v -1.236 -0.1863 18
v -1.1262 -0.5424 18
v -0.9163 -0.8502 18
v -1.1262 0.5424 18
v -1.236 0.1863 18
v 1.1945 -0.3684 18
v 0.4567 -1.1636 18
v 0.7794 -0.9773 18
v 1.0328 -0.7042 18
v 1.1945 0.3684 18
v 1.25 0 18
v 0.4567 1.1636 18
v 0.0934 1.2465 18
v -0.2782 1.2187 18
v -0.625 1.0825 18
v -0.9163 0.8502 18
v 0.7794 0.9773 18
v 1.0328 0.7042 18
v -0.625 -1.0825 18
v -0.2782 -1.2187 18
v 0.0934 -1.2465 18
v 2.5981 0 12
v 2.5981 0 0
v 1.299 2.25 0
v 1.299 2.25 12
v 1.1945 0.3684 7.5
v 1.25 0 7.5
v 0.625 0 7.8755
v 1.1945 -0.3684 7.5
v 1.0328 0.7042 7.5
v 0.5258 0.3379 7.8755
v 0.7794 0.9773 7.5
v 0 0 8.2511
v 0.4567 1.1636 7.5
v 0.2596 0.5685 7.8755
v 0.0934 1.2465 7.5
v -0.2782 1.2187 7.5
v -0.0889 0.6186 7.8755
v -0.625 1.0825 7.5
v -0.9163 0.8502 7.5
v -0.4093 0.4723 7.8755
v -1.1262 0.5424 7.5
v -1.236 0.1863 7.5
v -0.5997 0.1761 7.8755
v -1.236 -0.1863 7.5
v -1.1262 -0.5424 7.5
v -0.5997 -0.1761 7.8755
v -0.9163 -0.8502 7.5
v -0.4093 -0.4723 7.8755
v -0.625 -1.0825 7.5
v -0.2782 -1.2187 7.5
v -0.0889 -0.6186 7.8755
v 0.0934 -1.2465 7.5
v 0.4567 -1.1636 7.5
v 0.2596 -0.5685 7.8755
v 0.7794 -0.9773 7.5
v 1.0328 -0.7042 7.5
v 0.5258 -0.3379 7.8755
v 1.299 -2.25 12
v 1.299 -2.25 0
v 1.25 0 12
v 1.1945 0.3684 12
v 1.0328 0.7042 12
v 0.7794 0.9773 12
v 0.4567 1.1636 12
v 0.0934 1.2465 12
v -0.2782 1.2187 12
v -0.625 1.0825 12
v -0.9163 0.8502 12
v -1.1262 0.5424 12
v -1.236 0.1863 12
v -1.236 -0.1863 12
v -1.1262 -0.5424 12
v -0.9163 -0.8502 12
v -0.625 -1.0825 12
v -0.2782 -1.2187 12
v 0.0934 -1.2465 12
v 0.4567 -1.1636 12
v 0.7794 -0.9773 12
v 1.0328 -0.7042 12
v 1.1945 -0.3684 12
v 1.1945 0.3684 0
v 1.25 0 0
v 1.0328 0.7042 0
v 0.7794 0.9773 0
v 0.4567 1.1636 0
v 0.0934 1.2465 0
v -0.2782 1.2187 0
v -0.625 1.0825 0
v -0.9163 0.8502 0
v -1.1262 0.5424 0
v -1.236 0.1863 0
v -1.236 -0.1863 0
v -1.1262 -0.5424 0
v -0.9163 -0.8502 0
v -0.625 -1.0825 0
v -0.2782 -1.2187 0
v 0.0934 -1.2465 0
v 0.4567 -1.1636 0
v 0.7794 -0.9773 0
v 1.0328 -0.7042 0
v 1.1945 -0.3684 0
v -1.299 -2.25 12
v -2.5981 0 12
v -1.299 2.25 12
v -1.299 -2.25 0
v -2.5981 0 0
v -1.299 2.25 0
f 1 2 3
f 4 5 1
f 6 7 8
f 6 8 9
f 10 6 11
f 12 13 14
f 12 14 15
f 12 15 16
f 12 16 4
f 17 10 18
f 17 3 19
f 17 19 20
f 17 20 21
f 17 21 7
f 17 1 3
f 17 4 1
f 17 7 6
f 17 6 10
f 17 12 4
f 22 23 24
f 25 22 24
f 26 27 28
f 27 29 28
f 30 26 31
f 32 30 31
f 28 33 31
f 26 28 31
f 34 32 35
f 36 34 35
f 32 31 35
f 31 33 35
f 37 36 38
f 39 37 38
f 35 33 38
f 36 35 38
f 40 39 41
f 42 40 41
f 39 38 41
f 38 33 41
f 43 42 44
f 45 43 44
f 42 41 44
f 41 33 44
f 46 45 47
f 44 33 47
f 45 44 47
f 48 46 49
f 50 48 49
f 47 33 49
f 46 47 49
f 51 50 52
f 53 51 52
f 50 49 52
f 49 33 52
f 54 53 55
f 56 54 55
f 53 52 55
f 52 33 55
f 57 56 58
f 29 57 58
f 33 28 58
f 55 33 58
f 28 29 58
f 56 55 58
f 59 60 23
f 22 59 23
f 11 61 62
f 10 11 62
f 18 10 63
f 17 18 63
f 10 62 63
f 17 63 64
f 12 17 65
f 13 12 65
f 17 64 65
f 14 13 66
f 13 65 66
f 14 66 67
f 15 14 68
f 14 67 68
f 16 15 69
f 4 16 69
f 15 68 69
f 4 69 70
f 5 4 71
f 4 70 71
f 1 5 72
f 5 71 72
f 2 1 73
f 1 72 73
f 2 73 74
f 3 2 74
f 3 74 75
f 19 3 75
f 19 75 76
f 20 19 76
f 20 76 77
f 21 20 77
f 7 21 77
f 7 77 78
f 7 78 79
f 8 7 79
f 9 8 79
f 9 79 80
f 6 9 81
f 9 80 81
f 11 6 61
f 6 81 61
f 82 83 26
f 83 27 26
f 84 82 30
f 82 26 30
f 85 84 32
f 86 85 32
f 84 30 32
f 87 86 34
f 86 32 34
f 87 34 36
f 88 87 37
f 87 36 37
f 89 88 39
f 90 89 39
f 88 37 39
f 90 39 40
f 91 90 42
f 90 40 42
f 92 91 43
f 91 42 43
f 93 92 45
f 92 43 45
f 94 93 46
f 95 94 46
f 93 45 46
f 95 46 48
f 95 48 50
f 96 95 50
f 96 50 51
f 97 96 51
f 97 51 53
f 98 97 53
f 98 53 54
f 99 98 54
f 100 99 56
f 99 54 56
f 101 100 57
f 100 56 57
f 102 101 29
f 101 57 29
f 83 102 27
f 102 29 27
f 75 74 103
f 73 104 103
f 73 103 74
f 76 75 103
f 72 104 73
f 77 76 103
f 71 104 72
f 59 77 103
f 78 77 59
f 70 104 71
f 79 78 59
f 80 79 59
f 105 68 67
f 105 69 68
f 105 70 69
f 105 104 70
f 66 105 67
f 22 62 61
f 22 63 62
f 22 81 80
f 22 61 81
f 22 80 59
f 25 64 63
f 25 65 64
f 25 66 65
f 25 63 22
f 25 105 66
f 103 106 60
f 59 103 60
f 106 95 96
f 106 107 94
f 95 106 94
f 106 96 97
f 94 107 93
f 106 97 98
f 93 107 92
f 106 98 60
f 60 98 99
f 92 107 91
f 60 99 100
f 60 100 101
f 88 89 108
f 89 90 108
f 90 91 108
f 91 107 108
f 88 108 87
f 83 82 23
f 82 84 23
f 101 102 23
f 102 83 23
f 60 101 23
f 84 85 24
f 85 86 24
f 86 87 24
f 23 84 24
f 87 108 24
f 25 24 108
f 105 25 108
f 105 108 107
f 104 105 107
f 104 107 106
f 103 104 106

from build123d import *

# Parameters (mm, degrees)
EXTRUDE_1_DEPTH = 12
SKETCH_2_R      = 1.25
EXTRUDE_2_DEPTH = 6


# Read off the part's stored shape, not the designer's step: M3 螺纹孔1
with BuildPart() as part:
    # 草图1 → 凸台-拉伸1 (new body)
    with BuildSketch(Plane.XY):
        Polygon((2.598076211, 0), (1.299038106, 2.25), (-1.299038106, 2.25), (-2.598076211, 0), (-1.299038106, -2.25), (1.299038106, -2.25), align=None)
    extrude(amount=EXTRUDE_1_DEPTH)

    # 草图2 → 凸台-拉伸2 (add)
    with BuildSketch(Plane.XY.offset(12)):
        Circle(SKETCH_2_R)
    extrude(amount=EXTRUDE_2_DEPTH)

    # M3 螺纹孔1 outline → M3 螺纹孔1 (revolve, cut)
    with BuildSketch(Plane.XZ):
        Polygon((1.25, 7.5), (0, 8.251075774), (0, 0), (1.25, 0), align=None)
    revolve(axis=Axis((0, 0, 0), (0, 0, 1)), mode=Mode.SUBTRACT)


solid = part.part
